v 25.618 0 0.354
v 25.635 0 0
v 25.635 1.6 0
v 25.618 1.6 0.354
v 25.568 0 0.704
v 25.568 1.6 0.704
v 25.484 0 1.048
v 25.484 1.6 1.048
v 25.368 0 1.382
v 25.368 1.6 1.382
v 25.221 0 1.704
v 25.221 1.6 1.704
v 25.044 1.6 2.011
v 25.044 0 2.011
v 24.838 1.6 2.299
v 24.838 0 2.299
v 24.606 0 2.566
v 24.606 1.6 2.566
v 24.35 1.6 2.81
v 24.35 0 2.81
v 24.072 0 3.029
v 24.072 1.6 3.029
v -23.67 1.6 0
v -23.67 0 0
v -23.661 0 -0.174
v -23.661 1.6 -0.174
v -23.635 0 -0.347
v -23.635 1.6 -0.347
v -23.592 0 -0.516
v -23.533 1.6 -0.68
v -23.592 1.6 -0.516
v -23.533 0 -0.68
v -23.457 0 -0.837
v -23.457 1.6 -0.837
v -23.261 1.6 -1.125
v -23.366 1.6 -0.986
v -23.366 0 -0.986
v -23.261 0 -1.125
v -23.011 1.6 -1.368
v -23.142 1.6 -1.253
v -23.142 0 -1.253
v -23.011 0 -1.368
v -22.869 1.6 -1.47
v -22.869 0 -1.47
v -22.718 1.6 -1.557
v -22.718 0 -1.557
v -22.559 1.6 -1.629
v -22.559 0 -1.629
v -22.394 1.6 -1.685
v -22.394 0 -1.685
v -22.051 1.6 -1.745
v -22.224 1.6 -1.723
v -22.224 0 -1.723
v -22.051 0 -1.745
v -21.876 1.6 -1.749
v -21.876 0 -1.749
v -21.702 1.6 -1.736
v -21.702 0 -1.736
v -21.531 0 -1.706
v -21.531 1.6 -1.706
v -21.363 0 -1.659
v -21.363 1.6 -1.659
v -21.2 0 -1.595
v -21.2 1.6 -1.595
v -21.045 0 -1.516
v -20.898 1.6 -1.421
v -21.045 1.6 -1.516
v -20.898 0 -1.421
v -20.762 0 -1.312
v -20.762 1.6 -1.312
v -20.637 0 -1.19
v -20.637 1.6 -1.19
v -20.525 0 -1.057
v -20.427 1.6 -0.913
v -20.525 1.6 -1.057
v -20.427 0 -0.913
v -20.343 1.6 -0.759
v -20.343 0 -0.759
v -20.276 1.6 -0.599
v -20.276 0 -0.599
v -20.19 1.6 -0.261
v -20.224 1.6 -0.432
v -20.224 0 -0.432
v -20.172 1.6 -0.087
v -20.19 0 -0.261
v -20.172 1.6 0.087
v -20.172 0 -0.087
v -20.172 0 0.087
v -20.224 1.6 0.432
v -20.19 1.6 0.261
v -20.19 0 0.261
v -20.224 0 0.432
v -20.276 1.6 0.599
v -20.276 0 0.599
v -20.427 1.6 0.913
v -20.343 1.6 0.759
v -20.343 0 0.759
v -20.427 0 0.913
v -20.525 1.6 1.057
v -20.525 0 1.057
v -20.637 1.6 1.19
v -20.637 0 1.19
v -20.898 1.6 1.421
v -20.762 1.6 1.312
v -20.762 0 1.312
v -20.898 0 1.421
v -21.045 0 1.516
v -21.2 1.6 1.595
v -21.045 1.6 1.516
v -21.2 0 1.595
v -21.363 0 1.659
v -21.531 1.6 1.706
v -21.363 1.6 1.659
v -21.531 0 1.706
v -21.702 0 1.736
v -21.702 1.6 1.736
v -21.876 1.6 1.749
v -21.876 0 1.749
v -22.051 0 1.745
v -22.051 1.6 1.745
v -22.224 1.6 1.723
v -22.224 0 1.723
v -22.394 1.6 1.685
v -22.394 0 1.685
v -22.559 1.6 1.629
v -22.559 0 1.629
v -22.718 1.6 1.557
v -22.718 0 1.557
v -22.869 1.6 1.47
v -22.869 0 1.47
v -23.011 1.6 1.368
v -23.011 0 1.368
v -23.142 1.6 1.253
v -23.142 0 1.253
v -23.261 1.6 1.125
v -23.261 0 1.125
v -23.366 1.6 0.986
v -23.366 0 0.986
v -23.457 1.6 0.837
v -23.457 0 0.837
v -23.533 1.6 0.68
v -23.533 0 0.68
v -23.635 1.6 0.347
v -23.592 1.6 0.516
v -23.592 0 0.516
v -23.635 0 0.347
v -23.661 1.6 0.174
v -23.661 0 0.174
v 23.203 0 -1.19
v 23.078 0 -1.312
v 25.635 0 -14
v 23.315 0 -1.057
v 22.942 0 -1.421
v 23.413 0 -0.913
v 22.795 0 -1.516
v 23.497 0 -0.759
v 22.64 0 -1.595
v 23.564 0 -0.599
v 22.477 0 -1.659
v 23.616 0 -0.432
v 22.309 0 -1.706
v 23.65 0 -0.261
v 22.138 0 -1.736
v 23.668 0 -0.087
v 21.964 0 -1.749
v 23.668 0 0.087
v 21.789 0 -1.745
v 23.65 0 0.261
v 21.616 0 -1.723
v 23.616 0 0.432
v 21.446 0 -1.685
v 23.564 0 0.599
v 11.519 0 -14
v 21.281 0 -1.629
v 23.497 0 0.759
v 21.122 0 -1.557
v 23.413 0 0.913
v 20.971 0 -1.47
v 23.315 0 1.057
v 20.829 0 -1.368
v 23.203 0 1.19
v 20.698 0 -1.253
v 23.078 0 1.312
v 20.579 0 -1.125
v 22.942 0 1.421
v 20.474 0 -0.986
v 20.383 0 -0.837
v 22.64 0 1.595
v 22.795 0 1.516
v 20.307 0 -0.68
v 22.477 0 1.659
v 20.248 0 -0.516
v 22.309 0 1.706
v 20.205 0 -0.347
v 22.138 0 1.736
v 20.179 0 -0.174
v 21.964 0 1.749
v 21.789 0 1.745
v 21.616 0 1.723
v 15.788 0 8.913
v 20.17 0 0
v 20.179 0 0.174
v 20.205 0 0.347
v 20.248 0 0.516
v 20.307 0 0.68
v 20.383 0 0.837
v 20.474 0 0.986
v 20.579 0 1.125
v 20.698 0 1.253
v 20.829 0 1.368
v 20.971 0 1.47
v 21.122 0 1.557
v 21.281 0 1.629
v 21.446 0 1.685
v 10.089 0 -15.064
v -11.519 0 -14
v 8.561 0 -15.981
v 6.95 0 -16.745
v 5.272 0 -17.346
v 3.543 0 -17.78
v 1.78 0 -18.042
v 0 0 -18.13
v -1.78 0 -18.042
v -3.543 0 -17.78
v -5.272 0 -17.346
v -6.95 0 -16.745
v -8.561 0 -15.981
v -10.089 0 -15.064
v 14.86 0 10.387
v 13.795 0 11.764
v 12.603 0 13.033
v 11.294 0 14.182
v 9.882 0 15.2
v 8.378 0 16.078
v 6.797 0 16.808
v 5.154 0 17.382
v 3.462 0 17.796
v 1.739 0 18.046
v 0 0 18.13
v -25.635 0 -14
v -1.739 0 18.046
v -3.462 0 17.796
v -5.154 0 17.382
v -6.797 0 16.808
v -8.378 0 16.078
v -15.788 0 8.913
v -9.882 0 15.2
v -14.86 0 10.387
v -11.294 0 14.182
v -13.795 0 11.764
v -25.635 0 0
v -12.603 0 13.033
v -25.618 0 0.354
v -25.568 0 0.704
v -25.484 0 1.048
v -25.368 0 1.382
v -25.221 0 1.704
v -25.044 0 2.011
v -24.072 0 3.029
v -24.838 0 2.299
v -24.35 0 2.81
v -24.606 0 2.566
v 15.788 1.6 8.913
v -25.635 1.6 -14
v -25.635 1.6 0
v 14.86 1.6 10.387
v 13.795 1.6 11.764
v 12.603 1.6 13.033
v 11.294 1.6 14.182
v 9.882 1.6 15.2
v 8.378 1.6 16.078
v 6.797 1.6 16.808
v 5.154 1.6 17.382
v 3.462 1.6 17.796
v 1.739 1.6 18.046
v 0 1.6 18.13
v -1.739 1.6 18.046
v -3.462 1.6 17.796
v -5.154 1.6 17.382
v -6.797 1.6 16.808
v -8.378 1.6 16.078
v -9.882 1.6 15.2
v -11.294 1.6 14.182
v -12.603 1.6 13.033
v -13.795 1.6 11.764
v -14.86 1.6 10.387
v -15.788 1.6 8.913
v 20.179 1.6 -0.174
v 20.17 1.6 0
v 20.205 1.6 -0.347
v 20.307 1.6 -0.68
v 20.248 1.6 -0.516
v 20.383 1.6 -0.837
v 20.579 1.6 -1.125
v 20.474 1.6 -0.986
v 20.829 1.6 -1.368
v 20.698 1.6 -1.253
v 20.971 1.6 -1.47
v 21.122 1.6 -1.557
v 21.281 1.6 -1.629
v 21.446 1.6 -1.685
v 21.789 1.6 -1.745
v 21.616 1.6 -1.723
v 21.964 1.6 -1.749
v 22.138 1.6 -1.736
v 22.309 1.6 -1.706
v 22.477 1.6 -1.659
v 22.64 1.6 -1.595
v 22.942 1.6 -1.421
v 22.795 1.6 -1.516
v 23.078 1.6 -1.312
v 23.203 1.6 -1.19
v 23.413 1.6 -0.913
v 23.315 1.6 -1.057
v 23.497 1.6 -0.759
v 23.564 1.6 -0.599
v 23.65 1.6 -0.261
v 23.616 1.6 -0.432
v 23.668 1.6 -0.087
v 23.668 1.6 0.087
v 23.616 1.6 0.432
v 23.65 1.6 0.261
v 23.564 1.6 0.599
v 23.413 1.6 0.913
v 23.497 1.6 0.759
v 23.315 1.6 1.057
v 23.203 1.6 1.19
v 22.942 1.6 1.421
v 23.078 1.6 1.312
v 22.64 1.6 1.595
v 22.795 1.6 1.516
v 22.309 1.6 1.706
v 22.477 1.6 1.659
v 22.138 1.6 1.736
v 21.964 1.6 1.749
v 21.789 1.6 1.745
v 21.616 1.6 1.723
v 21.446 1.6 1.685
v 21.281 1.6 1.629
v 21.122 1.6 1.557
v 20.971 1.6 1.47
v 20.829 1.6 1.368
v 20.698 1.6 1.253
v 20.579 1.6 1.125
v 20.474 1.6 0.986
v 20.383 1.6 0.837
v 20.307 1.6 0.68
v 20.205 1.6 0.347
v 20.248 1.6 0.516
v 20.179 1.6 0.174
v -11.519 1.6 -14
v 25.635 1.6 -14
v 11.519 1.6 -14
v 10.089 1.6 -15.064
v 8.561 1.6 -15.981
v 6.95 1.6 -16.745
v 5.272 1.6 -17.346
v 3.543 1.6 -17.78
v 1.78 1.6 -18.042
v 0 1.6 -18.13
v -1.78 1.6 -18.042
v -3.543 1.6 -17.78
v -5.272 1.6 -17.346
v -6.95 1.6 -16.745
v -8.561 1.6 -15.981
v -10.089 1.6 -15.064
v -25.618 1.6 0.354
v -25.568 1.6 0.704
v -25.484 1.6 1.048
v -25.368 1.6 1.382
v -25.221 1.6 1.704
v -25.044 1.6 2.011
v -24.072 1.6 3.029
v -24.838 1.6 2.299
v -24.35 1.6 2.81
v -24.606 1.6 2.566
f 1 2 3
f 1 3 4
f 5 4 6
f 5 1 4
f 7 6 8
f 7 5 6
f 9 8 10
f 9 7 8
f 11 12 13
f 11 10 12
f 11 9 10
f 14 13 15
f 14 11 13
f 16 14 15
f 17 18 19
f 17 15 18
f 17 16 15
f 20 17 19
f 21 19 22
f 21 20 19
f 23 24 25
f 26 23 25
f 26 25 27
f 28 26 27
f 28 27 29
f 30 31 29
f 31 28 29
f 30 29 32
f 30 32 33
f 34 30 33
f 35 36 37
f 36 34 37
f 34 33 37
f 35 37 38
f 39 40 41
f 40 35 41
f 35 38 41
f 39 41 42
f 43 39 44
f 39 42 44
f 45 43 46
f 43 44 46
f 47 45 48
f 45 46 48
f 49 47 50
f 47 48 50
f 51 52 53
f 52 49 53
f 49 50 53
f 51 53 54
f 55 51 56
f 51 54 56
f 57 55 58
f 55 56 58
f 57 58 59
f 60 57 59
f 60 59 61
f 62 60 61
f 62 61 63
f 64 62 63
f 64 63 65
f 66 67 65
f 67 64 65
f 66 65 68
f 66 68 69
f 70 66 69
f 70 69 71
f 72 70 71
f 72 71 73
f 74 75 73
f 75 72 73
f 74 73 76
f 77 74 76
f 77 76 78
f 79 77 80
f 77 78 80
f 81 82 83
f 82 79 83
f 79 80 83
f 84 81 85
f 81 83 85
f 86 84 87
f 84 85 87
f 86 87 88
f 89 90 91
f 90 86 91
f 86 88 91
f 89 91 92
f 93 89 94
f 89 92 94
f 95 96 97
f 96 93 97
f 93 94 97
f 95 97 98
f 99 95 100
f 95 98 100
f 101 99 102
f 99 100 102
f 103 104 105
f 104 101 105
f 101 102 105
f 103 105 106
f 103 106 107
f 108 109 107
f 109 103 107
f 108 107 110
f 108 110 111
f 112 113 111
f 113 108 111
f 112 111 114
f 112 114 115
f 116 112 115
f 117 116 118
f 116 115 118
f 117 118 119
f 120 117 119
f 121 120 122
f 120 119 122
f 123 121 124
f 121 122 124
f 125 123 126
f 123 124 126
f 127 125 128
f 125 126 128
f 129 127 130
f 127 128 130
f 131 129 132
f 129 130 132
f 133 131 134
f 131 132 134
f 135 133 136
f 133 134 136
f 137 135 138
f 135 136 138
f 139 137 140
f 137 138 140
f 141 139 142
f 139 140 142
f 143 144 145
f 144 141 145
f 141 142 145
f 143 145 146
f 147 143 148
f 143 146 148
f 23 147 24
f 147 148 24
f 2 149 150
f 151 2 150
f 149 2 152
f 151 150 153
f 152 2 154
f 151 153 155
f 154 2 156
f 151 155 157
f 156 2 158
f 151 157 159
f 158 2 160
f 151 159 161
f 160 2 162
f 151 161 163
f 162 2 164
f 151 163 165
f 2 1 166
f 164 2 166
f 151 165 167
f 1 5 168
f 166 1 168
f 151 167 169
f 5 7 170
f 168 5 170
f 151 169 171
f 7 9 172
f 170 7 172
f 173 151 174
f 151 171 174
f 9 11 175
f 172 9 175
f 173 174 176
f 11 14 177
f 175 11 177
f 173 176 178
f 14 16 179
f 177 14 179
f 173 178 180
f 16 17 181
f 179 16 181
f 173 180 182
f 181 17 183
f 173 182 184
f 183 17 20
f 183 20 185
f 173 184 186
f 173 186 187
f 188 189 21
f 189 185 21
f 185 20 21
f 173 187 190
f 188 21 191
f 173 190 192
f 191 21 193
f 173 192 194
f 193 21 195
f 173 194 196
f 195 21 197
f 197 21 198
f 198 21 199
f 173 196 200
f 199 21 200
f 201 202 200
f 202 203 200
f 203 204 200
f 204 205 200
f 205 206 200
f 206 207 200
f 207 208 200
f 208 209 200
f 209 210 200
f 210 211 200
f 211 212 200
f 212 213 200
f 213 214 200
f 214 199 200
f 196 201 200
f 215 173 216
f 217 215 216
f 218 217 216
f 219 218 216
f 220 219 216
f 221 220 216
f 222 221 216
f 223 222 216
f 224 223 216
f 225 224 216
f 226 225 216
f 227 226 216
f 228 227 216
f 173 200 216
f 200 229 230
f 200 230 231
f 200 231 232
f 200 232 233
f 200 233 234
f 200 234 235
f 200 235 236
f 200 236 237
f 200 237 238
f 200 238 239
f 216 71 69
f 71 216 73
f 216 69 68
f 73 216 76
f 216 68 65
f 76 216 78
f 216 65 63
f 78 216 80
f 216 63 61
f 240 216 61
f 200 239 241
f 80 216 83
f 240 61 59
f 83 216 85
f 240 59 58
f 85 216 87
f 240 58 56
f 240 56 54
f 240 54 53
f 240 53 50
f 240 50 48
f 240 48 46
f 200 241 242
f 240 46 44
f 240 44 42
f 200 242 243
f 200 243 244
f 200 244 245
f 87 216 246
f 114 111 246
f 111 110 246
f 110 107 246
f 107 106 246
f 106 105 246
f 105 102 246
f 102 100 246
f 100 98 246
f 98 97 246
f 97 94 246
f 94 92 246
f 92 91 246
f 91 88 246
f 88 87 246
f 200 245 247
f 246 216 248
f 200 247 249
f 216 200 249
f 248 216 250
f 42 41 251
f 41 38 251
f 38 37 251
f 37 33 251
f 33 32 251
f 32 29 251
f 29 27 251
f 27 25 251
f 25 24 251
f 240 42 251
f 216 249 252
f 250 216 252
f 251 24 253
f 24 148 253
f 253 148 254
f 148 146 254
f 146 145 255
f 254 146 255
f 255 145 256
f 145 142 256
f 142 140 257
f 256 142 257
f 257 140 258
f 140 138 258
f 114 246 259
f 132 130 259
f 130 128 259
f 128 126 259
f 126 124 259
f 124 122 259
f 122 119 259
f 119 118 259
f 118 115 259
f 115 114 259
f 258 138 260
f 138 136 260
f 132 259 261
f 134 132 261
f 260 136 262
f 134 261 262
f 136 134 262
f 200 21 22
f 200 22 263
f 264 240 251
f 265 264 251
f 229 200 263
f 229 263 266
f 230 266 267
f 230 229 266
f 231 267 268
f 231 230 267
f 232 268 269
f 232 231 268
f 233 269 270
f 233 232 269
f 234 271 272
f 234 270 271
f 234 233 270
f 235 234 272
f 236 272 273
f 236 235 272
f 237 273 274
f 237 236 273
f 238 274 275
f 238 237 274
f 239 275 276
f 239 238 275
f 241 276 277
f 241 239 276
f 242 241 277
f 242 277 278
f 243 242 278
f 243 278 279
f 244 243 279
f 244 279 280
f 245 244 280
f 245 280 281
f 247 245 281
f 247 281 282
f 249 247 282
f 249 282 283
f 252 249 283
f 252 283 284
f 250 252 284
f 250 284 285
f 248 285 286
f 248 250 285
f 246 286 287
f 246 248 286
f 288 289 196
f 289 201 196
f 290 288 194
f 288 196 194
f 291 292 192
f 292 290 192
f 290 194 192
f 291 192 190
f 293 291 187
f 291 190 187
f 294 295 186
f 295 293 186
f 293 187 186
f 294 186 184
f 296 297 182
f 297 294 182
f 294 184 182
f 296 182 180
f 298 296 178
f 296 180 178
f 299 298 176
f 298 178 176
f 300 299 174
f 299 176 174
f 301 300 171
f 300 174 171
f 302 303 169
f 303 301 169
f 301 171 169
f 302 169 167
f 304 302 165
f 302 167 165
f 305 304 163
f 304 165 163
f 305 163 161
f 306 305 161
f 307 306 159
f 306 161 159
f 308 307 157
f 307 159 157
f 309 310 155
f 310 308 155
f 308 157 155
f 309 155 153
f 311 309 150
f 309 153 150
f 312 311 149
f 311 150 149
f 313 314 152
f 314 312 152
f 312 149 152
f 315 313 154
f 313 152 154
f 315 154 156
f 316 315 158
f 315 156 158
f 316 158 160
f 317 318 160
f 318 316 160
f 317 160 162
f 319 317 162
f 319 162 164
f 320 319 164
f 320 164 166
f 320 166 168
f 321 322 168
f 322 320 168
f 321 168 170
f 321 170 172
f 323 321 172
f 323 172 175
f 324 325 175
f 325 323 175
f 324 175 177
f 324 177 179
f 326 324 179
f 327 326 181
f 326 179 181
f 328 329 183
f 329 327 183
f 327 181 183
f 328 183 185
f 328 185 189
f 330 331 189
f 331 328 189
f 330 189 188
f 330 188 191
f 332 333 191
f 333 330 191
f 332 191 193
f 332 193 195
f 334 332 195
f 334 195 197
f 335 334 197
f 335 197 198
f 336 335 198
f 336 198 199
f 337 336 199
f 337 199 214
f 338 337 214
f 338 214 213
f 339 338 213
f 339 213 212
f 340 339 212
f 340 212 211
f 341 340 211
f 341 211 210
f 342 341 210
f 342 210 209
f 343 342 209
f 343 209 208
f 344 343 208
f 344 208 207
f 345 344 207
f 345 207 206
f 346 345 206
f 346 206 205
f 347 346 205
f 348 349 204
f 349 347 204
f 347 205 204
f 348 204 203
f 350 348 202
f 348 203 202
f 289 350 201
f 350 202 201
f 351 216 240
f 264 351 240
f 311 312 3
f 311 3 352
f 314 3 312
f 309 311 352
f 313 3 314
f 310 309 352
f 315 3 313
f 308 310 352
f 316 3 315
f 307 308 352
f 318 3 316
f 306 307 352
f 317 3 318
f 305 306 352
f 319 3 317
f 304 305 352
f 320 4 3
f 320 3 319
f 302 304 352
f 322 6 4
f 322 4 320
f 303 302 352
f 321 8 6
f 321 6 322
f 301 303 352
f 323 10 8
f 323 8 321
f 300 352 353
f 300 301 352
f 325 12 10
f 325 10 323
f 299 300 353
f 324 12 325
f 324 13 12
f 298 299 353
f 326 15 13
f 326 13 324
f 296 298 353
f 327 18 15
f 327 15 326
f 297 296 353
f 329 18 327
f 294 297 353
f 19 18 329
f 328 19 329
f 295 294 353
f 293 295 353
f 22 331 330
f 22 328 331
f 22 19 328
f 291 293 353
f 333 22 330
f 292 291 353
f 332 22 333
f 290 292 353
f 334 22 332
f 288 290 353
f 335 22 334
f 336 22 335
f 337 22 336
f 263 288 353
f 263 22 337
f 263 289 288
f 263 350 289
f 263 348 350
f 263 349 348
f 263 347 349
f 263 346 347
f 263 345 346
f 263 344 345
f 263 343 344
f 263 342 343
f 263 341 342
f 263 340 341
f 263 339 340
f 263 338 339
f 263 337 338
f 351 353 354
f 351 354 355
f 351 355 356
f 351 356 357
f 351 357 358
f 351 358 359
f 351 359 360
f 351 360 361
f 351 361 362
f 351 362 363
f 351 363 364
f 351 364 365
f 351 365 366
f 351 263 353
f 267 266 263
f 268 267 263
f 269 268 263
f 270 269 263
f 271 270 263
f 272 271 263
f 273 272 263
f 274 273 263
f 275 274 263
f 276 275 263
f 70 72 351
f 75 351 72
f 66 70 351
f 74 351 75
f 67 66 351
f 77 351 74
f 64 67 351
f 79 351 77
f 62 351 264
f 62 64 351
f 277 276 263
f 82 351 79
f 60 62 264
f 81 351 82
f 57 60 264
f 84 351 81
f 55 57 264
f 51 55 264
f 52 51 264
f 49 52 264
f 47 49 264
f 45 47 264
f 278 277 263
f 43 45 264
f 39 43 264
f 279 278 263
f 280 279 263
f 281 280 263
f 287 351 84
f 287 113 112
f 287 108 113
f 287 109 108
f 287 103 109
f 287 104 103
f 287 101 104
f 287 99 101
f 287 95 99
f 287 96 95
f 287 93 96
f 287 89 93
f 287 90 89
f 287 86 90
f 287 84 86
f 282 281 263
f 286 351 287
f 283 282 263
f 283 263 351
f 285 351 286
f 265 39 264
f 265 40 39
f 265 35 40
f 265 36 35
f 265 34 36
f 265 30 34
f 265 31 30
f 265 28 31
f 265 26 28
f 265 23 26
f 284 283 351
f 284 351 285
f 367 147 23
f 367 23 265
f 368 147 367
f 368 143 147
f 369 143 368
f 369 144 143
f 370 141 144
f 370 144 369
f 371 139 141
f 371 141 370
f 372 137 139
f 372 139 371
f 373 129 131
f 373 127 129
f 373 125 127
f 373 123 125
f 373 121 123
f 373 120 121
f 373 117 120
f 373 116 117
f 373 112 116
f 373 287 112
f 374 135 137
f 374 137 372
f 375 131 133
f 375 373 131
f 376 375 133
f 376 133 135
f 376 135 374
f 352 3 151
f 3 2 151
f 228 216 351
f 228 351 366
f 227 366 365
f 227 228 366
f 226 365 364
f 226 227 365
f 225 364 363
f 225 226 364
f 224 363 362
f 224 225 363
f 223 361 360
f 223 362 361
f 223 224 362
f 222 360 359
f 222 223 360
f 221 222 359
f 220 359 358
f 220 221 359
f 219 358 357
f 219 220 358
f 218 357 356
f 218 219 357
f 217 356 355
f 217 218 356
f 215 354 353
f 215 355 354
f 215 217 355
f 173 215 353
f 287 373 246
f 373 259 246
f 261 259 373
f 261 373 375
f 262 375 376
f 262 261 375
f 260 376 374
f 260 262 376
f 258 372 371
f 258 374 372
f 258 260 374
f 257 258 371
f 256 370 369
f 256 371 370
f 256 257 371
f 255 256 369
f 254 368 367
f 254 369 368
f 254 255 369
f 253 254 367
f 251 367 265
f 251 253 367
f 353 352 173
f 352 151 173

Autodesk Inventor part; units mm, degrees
ref_plane "YZ Plane" through (0, 0, 0) normal (1, 0, 0) x (0, 1, 0)
ref_plane "XZ Plane" through (0, 0, 0) normal (0, 1, 0) x (-1, 0, 0)
ref_plane "XY Plane" through (0, 0, 0) normal (0, 0, 1) x (1, 0, 0)
sketch "Sketch1" plane through (0, 0, 0) normal (0, 1, 0) x (-1, 0, 0)
  circle A0 centre (-21.92, 0) radius 1.75
  circle A1 centre (21.92, 0) radius 1.75
  circle A2 centre (0, 0) radius 18.13
  circle A3 centre (-21.92, 0) radius 3.715
  circle A4 centre (21.92, 0) radius 3.715
  line L0 (-25.635, 0) -> (-25.635, -14)
  line L1 (-25.635, -14) -> (-11.5194, -14)
  line L2 (11.5194, -14) -> (25.635, -14)
  line L3 (25.635, -14) -> (25.635, 0)
  line L4 (24.0715, 3.0286) -> (15.7877, 8.9132)
  line L5 (-24.0715, 3.0286) -> (-15.7877, 8.9132)
  dimension "d0" = 3.5
  dimension "d1" = 43.84
  dimension "d2" = 21.92
  dimension "d3" = 36.26
  dimension "d4" = 51.27
  dimension "d5" = 14
  dimension "d7" = 35.389
extrude "Extrusion1" add sketch "Sketch1" along normal blind 1.6
equation "\"d2\" = 0.5 * d1"
properties part number "Mellow Fly SHT36" material "Copper, Alloy"
